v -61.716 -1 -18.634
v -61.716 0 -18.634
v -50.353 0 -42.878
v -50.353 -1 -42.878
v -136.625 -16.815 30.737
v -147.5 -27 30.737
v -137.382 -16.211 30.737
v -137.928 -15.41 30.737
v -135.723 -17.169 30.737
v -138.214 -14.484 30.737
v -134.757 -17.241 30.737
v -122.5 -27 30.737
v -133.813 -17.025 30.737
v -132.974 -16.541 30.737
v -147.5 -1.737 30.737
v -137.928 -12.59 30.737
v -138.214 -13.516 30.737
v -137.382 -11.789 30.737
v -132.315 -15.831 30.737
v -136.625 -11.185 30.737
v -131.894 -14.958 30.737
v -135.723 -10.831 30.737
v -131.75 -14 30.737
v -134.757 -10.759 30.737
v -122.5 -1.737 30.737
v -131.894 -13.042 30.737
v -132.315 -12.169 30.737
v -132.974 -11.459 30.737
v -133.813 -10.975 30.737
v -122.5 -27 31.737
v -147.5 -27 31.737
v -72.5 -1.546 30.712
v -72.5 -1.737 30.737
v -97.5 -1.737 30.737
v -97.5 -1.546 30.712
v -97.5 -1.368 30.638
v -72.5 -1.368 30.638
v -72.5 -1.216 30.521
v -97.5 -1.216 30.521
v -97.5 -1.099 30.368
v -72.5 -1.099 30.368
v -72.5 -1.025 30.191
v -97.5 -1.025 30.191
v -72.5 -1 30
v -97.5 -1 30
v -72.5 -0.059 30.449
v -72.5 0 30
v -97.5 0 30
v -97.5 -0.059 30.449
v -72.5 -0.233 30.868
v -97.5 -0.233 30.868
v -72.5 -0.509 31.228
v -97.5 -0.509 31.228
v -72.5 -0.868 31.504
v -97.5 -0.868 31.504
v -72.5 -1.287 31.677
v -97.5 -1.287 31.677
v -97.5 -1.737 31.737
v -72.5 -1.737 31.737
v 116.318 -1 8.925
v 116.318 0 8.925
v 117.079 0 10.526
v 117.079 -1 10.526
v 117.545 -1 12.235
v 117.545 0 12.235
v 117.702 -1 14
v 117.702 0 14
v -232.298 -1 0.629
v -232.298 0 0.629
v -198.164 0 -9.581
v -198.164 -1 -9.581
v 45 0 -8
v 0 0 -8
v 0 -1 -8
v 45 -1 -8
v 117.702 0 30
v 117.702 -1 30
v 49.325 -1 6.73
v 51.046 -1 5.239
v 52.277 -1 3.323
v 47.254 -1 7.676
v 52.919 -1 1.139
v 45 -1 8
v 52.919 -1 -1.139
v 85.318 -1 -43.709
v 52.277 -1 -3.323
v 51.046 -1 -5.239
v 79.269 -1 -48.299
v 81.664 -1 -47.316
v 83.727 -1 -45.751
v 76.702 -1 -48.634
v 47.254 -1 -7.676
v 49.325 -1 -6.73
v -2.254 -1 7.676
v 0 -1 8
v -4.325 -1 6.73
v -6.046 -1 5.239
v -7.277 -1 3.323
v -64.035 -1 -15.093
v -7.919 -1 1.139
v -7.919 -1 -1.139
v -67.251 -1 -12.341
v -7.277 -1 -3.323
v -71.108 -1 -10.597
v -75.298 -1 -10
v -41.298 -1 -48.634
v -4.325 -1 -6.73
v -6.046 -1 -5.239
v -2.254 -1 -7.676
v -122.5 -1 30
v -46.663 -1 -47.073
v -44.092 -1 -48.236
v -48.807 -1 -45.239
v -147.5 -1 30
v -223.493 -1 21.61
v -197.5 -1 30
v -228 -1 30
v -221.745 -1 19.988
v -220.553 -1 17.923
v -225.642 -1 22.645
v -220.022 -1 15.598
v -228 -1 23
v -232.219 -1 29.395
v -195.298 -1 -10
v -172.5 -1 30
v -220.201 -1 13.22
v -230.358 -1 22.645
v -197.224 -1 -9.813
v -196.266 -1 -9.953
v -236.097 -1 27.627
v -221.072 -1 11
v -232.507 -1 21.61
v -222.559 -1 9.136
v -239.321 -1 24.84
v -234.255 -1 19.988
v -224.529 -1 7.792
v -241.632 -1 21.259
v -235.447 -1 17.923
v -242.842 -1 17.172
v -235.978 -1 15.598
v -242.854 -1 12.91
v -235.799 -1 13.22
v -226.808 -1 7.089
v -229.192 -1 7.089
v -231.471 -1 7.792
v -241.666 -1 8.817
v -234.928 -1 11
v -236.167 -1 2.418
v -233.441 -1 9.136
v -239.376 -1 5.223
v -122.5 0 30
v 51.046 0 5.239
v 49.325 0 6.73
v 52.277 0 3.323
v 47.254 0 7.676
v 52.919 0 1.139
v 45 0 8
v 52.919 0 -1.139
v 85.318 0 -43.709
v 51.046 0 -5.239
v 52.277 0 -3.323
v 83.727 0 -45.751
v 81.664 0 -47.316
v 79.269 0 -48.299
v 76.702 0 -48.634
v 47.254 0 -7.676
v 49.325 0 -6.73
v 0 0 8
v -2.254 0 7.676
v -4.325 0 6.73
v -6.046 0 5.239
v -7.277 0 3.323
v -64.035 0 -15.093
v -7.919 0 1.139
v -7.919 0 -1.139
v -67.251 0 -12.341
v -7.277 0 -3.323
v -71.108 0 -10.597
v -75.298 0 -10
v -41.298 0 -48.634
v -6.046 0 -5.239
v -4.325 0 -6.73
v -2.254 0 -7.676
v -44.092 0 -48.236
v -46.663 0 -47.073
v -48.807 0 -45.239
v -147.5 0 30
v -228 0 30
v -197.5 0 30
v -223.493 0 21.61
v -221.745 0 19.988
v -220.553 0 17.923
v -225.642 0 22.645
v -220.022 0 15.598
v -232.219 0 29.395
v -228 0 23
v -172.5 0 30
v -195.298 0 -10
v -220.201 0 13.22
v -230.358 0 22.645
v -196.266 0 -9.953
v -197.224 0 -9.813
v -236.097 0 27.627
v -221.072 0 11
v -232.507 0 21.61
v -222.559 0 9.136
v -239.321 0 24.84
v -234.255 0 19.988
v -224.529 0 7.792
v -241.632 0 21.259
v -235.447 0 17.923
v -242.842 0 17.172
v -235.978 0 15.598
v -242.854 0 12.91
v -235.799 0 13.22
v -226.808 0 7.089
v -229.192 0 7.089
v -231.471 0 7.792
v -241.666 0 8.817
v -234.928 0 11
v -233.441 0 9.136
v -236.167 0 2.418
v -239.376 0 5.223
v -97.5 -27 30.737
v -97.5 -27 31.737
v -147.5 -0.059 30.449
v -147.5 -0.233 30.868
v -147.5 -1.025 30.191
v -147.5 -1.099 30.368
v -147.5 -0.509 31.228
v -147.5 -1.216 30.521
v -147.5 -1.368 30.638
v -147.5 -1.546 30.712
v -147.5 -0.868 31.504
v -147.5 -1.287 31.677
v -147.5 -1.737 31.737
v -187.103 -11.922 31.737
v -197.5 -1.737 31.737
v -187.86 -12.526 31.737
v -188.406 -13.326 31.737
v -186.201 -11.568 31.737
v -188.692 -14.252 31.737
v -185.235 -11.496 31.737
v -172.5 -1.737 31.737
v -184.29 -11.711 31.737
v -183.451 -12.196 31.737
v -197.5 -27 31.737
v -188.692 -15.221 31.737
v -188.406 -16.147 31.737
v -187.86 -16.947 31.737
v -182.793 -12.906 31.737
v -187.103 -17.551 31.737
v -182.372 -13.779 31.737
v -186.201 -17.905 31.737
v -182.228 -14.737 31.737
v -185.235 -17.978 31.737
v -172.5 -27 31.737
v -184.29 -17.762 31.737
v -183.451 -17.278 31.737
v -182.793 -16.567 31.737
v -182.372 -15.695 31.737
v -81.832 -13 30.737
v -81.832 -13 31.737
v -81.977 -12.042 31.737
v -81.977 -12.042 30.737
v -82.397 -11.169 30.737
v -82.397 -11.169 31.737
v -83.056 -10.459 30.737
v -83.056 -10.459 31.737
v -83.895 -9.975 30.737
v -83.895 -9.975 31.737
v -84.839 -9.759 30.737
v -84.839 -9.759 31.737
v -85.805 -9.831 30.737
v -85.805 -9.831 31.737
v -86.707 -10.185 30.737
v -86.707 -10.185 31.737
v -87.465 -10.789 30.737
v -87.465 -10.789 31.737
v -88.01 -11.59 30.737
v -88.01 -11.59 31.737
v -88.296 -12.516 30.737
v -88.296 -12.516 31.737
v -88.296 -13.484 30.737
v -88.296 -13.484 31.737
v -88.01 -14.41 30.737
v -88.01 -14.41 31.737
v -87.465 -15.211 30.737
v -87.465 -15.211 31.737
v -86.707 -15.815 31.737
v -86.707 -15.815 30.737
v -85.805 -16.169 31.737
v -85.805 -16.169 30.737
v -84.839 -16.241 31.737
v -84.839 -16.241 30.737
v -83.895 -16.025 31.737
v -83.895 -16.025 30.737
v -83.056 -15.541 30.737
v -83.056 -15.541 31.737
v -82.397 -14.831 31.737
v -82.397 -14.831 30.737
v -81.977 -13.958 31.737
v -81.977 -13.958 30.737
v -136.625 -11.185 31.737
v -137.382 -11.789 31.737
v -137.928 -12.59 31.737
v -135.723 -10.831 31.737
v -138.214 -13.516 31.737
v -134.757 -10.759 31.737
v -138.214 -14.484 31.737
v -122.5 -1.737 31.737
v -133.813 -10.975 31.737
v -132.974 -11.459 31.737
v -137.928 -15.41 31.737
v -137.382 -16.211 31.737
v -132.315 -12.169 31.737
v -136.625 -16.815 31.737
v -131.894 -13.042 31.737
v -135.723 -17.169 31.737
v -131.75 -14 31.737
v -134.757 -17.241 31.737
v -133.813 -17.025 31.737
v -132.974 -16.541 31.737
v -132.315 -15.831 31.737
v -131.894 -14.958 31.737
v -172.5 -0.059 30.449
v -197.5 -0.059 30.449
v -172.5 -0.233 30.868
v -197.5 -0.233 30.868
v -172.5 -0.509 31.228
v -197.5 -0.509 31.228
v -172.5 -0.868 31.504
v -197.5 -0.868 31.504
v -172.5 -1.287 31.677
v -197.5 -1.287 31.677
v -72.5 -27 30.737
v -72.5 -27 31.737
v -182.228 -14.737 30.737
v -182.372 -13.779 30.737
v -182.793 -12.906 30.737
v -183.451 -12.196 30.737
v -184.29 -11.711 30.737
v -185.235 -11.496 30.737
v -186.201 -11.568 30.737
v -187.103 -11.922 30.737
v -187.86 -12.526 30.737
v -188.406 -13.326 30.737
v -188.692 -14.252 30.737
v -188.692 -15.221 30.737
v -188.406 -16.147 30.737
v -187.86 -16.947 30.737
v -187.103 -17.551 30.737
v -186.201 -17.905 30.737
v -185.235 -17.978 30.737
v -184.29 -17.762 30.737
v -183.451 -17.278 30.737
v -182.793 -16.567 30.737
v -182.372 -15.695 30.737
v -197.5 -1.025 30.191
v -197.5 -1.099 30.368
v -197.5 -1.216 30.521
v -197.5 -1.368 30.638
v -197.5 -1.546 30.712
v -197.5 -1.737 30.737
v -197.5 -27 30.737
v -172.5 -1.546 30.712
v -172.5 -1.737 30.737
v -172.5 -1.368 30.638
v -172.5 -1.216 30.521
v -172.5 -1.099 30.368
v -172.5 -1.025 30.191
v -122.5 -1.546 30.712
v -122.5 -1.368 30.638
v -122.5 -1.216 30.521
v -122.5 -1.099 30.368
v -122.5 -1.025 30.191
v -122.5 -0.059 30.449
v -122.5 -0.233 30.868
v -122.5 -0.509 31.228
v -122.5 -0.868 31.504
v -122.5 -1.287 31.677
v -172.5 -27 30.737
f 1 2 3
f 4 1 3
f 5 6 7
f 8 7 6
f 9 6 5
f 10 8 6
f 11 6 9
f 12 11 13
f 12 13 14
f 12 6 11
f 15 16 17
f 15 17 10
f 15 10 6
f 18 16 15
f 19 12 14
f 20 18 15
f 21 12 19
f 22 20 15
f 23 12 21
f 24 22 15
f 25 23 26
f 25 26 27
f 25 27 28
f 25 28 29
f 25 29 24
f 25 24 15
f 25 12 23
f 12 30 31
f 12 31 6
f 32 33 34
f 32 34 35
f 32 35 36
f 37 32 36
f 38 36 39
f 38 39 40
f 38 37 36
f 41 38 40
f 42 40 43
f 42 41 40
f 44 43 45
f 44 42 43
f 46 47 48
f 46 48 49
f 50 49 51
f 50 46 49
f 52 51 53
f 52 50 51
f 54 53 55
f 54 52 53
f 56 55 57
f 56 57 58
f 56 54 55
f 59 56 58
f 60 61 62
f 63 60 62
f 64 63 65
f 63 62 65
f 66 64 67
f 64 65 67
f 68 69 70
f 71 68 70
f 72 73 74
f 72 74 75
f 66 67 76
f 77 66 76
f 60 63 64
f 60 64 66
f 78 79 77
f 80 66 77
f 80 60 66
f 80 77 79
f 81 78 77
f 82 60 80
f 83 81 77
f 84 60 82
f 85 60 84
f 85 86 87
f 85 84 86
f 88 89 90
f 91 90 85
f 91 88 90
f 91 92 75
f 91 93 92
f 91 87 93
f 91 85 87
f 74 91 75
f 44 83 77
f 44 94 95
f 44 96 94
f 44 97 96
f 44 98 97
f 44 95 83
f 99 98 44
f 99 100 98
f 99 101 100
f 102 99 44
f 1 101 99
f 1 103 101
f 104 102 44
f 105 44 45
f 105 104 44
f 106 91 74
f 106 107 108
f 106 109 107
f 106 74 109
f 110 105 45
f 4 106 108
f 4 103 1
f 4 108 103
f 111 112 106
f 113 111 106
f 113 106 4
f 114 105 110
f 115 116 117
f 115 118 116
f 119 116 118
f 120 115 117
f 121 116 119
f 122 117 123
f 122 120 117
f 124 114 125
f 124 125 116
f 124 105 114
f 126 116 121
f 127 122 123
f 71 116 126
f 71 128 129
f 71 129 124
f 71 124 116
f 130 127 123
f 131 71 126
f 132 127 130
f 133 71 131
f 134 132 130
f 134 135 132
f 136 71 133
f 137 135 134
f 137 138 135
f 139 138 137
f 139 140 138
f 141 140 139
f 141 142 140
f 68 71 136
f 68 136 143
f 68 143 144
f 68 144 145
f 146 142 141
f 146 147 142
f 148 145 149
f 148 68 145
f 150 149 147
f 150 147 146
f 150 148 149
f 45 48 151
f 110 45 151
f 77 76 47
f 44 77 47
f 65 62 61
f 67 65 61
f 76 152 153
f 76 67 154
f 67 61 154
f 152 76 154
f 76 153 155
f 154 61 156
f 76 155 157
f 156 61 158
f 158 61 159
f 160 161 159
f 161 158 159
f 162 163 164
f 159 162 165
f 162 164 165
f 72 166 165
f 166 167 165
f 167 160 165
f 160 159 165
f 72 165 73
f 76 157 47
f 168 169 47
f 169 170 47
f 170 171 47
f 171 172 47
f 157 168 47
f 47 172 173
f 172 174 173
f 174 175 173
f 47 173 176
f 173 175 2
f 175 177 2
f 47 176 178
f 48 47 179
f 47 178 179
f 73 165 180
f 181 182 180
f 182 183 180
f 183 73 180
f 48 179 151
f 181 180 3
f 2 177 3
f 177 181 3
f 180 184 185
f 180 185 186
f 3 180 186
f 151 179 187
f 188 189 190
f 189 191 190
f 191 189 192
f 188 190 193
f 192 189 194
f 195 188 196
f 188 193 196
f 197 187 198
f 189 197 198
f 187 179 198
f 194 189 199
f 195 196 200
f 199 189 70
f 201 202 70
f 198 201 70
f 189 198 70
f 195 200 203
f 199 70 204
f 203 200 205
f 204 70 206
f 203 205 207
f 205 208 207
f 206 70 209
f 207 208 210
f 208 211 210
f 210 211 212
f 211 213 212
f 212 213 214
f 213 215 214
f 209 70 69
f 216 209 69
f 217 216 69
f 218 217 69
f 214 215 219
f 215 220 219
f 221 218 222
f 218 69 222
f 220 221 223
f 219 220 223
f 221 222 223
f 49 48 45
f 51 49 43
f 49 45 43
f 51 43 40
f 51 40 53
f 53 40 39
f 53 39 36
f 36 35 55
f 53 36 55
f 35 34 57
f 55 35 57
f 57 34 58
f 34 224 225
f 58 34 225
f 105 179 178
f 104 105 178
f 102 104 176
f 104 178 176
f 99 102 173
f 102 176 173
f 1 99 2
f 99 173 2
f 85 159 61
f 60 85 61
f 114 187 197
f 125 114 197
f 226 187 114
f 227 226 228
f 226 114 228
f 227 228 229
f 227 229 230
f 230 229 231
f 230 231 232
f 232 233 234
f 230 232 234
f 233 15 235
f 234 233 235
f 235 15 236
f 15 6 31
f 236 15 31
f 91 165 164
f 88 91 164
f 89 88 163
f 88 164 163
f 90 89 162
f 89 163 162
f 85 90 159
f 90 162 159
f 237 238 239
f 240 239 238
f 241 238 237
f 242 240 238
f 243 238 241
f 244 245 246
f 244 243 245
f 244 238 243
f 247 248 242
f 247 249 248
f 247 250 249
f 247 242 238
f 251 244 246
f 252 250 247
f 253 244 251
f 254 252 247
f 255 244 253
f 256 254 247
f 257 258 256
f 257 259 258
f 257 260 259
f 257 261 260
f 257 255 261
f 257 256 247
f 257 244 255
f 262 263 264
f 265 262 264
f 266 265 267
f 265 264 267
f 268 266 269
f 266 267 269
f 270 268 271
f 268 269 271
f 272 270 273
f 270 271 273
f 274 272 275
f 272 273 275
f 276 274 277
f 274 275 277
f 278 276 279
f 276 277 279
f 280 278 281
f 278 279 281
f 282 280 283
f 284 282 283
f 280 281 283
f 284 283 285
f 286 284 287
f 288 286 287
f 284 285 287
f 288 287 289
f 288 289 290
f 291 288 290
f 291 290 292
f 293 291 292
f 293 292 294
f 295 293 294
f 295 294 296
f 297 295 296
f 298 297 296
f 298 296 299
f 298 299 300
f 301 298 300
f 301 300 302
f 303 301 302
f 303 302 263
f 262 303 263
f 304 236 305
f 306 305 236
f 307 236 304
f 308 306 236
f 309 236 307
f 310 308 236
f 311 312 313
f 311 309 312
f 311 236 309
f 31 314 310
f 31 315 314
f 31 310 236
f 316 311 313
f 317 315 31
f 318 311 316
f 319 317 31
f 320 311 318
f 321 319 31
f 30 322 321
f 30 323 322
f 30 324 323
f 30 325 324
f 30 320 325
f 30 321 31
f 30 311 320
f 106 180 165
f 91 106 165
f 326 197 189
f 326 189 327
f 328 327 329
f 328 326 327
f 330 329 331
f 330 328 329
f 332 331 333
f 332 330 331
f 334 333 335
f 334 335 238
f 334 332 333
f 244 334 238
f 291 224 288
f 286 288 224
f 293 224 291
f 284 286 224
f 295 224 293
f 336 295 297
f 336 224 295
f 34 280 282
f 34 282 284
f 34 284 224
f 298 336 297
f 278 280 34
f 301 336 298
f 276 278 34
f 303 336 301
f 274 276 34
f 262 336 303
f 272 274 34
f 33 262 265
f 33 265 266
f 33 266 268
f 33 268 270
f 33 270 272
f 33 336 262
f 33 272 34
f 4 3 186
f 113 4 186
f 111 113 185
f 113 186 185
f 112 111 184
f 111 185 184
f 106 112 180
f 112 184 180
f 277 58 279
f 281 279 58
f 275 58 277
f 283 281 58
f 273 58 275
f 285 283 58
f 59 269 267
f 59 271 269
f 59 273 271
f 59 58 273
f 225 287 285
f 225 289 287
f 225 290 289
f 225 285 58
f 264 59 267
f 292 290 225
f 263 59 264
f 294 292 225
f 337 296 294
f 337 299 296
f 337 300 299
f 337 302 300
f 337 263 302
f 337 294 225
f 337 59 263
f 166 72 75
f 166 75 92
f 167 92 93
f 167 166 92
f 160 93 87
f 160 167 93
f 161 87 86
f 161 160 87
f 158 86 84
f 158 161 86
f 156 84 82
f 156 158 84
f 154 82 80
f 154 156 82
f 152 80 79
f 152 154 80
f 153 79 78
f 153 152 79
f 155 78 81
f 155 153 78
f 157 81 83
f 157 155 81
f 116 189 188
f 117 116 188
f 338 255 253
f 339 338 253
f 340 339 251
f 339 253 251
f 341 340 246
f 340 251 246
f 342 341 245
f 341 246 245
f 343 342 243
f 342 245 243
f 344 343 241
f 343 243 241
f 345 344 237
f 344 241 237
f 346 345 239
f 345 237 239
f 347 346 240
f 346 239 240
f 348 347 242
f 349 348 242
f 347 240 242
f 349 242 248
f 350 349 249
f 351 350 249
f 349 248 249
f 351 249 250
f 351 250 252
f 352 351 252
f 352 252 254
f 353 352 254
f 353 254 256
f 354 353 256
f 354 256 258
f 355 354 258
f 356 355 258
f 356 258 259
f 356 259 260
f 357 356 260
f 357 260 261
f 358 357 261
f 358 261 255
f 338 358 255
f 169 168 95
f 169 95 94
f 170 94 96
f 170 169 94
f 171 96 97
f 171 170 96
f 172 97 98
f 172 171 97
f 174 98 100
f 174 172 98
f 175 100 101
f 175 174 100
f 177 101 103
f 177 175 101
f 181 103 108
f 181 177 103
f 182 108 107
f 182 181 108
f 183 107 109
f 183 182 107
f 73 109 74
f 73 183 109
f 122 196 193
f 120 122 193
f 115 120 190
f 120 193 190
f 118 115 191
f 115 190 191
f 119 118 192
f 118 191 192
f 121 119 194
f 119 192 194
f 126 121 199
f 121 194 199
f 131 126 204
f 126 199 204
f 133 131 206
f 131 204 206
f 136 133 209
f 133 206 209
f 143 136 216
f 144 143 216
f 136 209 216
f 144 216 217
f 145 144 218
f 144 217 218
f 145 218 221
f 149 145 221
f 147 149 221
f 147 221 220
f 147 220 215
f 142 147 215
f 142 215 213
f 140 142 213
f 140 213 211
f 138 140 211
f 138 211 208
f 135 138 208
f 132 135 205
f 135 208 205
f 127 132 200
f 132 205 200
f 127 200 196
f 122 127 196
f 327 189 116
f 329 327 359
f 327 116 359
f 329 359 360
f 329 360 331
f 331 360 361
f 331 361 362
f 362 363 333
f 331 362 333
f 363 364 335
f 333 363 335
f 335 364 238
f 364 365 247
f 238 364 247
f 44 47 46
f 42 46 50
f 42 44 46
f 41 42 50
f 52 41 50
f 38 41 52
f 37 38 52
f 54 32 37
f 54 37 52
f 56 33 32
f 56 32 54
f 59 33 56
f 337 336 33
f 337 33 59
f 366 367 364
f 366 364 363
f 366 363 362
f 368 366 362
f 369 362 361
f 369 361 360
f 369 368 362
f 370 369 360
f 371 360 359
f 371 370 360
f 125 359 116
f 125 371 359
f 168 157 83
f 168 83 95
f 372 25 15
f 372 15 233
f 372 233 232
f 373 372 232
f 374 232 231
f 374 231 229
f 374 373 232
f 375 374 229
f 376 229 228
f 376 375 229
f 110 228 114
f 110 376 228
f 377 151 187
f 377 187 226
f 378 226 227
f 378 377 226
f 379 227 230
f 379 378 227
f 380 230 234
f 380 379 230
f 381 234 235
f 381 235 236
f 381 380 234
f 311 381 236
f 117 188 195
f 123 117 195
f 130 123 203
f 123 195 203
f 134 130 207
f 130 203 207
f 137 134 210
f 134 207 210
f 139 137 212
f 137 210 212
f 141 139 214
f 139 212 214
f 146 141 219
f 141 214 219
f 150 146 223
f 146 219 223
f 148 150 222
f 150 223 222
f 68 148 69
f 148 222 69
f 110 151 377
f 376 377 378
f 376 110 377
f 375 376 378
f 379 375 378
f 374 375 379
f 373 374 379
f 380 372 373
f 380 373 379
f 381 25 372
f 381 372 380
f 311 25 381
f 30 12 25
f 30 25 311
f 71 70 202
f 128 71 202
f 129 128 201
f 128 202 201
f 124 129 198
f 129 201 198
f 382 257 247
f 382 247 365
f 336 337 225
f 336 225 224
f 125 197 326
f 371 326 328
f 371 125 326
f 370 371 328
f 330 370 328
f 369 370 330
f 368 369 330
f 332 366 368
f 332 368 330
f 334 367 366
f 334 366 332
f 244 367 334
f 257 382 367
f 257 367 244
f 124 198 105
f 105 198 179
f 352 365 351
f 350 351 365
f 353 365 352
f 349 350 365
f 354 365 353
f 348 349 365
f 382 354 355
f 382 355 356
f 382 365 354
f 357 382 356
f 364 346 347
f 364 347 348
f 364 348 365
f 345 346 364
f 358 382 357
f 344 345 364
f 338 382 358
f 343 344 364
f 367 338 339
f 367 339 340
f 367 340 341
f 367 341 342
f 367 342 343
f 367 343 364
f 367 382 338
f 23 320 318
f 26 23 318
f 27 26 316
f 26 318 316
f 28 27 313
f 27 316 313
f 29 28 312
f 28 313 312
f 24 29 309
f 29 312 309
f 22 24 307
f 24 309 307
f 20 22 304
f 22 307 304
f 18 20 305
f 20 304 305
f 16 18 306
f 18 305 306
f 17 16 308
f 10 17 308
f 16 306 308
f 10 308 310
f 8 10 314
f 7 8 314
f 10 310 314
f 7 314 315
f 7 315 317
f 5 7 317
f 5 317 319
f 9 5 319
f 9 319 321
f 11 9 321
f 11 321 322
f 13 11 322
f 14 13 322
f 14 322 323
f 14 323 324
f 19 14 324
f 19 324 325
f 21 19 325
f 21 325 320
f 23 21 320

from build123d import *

# Parameters (mm, degrees)
SKETCH2_R          = 8
BASE_FLANGE1_DEPTH = 1
EDGE_FLANGE5_DEPTH = 25
EDGE_FLANGE6_DEPTH = 25
EDGE_FLANGE7_DEPTH = 25
SKETCH29_R         = 3.25
CUT_EXTRUDE2_DEPTH = 10


# Sheet-metal steps are written as plain solids
with BuildPart() as part:
    # Sketch2 → Base-Flange1 (new body)
    with BuildSketch(Plane(origin=(0, 0, 0), x_dir=(1, 0, 0), z_dir=(0, 1, 0))):
        with BuildLine():
            Line((-41.298383568, 48.634081388), (76.701616432, 48.634081388))
            ThreePointArc((76.701616432, 48.634081388), (81.664016801, 47.315935025), (85.318183171, 43.708997903))
            Line((85.318183171, 43.708997903), (116.318183171, -8.925083485))
            ThreePointArc((116.318183171, -8.925083485), (117.349560964, -11.369949372), (117.701616432, -14))
            Line((117.701616432, -14), (117.701616432, -30))
            Line((117.701616432, -30), (-228, -30))
            ThreePointArc((-228, -30), (-242.841901676, -17.172085321), (-232.298383568, -0.629060619))
            Line((-232.298383568, -0.629060619), (-198.163972613, 9.580626254))
            ThreePointArc((-198.163972613, 9.580626254), (-196.746440448, 9.894601117), (-195.298383568, 10))
            Line((-195.298383568, 10), (-75.298383568, 10))
            ThreePointArc((-75.298383568, 10), (-67.251296492, 12.341232699), (-61.716223201, 18.634081388))
            Line((-61.716223201, 18.634081388), (-50.353157146, 42.878027129))
            ThreePointArc((-50.353157146, 42.878027129), (-46.663108285, 47.073259589), (-41.298383568, 48.634081388))
        make_face()
        with Locations(Location((-228, -15, 0), (0, 0, 270))):
            Circle(SKETCH2_R, mode=Mode.SUBTRACT)
        with BuildLine():
            Line((0, 8), (45, 8))
            ThreePointArc((45, 8), (53, 0), (45, -8))
            Line((45, -8), (0, -8))
            ThreePointArc((0, -8), (-8, 0), (0, 8))
        make_face(mode=Mode.SUBTRACT)
    extrude(amount=-BASE_FLANGE1_DEPTH)

    # Edge-Flange5 section (across the edge) → Edge-Flange5 (add)
    with BuildSketch(Plane(origin=(-172.5, -1, 30.7366), x_dir=(0, 0, -1), z_dir=(-1, 0, 0))):
        with BuildLine():
            Line((-1, 0.7366), (-1, 26))
            Line((-1, 26), (0, 26))
            Line((0, 26), (0, 0.7366))
            ThreePointArc((0, 0.7366), (0.215745145, 0.215745145), (0.7366, 0))
            Line((0.7366, 0), (0.7366, -1))
            ThreePointArc((0.7366, -1), (-0.491361636, -0.491361636), (-1, 0.7366))
        make_face()
    extrude(amount=EDGE_FLANGE5_DEPTH)

    # Edge-Flange6 section (across the edge) → Edge-Flange6 (add)
    with BuildSketch(Plane(origin=(-122.5, -1, 30.7366), x_dir=(0, 0, -1), z_dir=(-1, 0, 0))):
        with BuildLine():
            Line((-1, 0.7366), (-1, 26))
            Line((-1, 26), (0, 26))
            Line((0, 26), (0, 0.7366))
            ThreePointArc((0, 0.7366), (0.215745145, 0.215745145), (0.7366, 0))
            Line((0.7366, 0), (0.7366, -1))
            ThreePointArc((0.7366, -1), (-0.491361636, -0.491361636), (-1, 0.7366))
        make_face()
    extrude(amount=EDGE_FLANGE6_DEPTH)

    # Edge-Flange7 section (across the edge) → Edge-Flange7 (add)
    with BuildSketch(Plane(origin=(-72.5, -1, 30.7366), x_dir=(0, 0, -1), z_dir=(-1, 0, 0))):
        with BuildLine():
            Line((-1, 0.7366), (-1, 26))
            Line((-1, 26), (0, 26))
            Line((0, 26), (0, 0.7366))
            ThreePointArc((0, 0.7366), (0.215745145, 0.215745145), (0.7366, 0))
            Line((0.7366, 0), (0.7366, -1))
            ThreePointArc((0.7366, -1), (-0.491361636, -0.491361636), (-1, 0.7366))
        make_face()
    extrude(amount=EDGE_FLANGE7_DEPTH)

    # Sketch29 → Cut-Extrude2 (cut)
    with BuildSketch(Plane.XY.offset(31.7366)):
        with Locations((-85.082297009, -13)):
            Circle(SKETCH29_R)
        with Locations((-135, -14)):
            Circle(SKETCH29_R)
        with Locations((-185.477801268, -14.7366)):
            Circle(SKETCH29_R)
    extrude(amount=-CUT_EXTRUDE2_DEPTH, mode=Mode.SUBTRACT)


solid = part.part
